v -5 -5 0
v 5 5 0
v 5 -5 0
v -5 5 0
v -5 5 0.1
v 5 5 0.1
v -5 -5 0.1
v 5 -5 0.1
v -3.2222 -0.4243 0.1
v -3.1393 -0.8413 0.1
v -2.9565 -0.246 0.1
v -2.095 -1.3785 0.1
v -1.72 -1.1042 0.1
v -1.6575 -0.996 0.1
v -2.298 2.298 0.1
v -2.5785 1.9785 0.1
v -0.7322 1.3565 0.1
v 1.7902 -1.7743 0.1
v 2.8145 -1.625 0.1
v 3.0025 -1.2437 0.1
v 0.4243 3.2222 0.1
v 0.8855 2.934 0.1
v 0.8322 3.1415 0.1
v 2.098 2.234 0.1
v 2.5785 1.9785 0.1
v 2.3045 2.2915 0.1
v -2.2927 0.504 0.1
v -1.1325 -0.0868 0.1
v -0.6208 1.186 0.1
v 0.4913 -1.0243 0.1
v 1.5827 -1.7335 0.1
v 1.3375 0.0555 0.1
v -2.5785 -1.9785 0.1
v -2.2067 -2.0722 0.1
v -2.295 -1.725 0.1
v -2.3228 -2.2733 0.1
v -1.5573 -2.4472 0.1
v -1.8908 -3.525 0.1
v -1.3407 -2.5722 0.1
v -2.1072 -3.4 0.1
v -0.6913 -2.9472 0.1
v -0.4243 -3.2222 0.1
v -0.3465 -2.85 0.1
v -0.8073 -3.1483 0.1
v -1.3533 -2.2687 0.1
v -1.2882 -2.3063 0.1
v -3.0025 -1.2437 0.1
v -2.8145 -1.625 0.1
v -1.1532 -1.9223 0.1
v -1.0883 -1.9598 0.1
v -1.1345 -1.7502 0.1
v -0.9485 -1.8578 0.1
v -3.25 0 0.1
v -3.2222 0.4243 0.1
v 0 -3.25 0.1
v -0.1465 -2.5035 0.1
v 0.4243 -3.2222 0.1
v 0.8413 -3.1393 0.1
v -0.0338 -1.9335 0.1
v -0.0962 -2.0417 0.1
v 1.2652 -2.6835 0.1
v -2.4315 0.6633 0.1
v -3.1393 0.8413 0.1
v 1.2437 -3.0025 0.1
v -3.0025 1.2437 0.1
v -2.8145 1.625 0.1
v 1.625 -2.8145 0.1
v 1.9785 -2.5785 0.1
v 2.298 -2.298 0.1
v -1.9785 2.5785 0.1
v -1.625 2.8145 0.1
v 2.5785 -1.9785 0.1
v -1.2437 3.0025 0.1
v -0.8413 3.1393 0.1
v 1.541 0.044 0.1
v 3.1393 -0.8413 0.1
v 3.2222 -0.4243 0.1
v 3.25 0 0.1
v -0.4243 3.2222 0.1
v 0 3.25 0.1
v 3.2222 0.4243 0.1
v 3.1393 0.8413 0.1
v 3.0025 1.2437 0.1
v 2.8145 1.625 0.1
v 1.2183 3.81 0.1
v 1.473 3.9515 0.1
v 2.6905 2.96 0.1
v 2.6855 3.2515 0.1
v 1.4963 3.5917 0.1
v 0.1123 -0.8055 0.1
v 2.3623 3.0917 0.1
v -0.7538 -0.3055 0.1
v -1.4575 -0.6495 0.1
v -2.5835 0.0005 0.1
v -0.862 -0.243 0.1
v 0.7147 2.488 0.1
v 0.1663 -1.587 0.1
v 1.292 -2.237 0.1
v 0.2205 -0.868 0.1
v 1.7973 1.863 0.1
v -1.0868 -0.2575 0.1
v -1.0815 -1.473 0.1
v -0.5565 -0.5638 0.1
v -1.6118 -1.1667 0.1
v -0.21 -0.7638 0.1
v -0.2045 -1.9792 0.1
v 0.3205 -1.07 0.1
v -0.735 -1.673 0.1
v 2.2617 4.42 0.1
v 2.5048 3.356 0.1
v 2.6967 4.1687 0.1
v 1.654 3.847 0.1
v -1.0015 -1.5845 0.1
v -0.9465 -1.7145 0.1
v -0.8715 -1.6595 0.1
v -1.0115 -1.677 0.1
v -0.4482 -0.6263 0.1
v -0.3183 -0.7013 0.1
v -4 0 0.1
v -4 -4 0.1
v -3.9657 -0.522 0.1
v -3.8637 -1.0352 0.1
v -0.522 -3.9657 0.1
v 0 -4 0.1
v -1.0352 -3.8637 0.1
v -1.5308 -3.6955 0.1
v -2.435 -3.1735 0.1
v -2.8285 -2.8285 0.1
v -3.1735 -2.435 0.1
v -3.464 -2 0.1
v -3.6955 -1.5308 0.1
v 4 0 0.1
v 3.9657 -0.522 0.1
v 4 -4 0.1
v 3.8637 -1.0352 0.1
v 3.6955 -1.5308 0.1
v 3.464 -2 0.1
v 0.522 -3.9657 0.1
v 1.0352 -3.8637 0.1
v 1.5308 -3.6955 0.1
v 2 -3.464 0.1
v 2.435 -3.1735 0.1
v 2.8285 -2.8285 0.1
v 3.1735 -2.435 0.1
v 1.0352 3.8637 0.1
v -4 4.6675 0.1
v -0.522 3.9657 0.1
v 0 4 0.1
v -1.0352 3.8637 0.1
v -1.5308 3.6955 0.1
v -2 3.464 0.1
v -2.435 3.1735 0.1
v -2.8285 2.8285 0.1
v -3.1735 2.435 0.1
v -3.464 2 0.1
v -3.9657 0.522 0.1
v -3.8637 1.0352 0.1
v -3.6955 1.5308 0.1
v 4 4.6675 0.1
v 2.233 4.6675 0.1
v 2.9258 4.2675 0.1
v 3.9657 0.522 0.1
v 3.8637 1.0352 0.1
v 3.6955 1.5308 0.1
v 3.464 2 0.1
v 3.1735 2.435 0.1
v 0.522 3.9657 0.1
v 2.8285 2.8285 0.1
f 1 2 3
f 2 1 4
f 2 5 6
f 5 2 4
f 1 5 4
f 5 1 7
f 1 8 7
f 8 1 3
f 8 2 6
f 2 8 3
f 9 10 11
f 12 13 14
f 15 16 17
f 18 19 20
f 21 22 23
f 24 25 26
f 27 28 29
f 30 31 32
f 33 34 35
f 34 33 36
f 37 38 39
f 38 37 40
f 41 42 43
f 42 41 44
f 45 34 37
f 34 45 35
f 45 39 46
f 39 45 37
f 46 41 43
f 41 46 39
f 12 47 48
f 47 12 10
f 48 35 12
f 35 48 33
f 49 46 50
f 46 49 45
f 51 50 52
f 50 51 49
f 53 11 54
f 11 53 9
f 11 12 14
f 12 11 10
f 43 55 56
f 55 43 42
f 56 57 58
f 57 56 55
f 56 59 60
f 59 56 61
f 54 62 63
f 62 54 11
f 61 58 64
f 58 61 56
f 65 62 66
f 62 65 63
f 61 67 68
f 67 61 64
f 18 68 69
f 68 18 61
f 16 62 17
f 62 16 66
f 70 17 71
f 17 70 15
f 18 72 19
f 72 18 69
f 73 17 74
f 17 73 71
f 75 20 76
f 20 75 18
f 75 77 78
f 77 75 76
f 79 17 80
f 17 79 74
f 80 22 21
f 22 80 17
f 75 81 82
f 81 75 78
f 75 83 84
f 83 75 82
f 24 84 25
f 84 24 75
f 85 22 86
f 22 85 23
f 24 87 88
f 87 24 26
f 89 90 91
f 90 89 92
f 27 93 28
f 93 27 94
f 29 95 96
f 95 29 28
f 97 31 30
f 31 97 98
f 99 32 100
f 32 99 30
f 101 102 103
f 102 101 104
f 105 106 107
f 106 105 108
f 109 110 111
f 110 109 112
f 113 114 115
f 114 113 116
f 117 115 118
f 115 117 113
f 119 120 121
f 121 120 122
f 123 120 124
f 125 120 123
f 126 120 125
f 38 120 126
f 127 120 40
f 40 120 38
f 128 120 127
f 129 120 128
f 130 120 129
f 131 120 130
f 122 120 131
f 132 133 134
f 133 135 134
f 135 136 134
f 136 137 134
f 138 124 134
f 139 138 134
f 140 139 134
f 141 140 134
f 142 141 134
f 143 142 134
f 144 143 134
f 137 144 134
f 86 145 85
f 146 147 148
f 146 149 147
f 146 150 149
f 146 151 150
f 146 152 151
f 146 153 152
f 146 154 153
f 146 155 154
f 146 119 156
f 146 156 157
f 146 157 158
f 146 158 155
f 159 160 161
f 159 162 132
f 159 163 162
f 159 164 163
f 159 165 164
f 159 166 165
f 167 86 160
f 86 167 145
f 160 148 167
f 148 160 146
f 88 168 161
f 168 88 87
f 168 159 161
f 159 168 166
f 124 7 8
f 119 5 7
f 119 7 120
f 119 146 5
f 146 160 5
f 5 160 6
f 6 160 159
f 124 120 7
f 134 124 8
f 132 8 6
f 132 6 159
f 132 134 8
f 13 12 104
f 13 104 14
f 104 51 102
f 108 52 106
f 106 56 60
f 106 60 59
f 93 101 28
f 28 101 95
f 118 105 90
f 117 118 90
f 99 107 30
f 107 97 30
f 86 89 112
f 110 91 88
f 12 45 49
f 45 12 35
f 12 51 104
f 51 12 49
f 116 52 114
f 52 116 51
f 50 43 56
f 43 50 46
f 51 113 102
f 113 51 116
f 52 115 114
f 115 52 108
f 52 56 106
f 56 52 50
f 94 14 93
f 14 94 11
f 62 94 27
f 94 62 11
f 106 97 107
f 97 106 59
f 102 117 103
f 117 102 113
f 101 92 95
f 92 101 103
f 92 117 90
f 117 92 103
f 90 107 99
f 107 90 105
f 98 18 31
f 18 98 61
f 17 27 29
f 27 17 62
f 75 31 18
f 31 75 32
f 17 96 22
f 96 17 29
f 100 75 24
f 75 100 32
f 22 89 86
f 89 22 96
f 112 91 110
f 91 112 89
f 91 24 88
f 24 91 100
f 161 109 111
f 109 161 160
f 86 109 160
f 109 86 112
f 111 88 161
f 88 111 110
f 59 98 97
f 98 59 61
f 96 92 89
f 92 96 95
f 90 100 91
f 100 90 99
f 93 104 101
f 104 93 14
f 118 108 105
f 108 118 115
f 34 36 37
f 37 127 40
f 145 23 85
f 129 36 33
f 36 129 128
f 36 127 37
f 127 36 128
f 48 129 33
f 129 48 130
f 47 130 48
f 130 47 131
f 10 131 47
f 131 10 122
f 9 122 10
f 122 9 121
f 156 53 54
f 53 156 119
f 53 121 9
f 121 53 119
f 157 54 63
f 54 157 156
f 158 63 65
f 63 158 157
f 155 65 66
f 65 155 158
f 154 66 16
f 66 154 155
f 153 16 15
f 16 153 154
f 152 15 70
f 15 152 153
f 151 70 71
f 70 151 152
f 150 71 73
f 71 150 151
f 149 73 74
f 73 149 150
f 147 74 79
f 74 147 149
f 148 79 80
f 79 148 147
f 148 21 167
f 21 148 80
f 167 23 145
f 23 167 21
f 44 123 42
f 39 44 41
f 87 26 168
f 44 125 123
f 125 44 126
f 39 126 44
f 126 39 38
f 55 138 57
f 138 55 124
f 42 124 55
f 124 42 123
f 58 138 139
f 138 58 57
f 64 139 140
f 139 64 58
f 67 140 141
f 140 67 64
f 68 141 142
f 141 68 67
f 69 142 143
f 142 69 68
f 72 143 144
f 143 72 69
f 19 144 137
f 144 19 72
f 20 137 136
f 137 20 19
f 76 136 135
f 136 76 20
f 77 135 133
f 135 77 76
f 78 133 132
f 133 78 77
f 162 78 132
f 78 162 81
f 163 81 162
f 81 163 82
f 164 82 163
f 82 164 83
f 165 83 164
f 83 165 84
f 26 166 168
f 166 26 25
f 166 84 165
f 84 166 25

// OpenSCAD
// file: s/3068bp11s02.scad
use <../../lib.scad>
function ldraw_lib__s__3068bp11s02() = [
// 0 ~Launch Command Logo Pattern Background
// 0 Name: s\3068bp11s02.dat
// 0 Author: Chris Böhnke [KnightOfTarenta]
// 0 !LDRAW_ORG Subpart UPDATE 2025-03
// 0 !LICENSE Licensed under CC BY 4.0 : see CAreadme.txt
// 
// 0 !HELP Dimensions X = 32; Z = 34.67
// 
// 0 BFC CERTIFY CCW
  [0,"BFC","CERTIFY"],
  [0,"BFC","CCW"],
// 
// 0 !HISTORY 2025-03-30 [OrionP] Official Update 2025-03
// 
// 3 16 -16 0 0 -16 0 -16 -15.863 0 -2.088
  [3,16,-16,0,0,-16,0,-16,-15.863,0,-2.088],
// 3 16 -15.863 0 -2.088 -16 0 -16 -15.455 0 -4.141
  [3,16,-15.863,0,-2.088,-16,0,-16,-15.455,0,-4.141],
// 3 16 -2.088 0 -15.863 -16 0 -16 0 0 -16
  [3,16,-2.088,0,-15.863,-16,0,-16,0,0,-16],
// 3 16 -4.141 0 -15.455 -16 0 -16 -2.088 0 -15.863
  [3,16,-4.141,0,-15.455,-16,0,-16,-2.088,0,-15.863],
// 3 16 -6.123 0 -14.782 -16 0 -16 -4.141 0 -15.455
  [3,16,-6.123,0,-14.782,-16,0,-16,-4.141,0,-15.455],
// 3 16 -7.563 0 -14.1 -16 0 -16 -6.123 0 -14.782
  [3,16,-7.563,0,-14.1,-16,0,-16,-6.123,0,-14.782],
// 3 16 -9.74 0 -12.694 -16 0 -16 -8.429 0 -13.6
  [3,16,-9.74,0,-12.694,-16,0,-16,-8.429,0,-13.6],
// 3 16 -8.429 0 -13.6 -16 0 -16 -7.563 0 -14.1
  [3,16,-8.429,0,-13.6,-16,0,-16,-7.563,0,-14.1],
// 3 16 -11.314 0 -11.314 -16 0 -16 -9.74 0 -12.694
  [3,16,-11.314,0,-11.314,-16,0,-16,-9.74,0,-12.694],
// 3 16 -12.694 0 -9.74 -16 0 -16 -11.314 0 -11.314
  [3,16,-12.694,0,-9.74,-16,0,-16,-11.314,0,-11.314],
// 3 16 -13.856 0 -8 -16 0 -16 -12.694 0 -9.74
  [3,16,-13.856,0,-8,-16,0,-16,-12.694,0,-9.74],
// 3 16 -14.782 0 -6.123 -16 0 -16 -13.856 0 -8
  [3,16,-14.782,0,-6.123,-16,0,-16,-13.856,0,-8],
// 3 16 -15.455 0 -4.141 -16 0 -16 -14.782 0 -6.123
  [3,16,-15.455,0,-4.141,-16,0,-16,-14.782,0,-6.123],
// 3 16 16 0 0 15.863 0 -2.088 16 0 -16
  [3,16,16,0,0,15.863,0,-2.088,16,0,-16],
// 3 16 15.863 0 -2.088 15.455 0 -4.141 16 0 -16
  [3,16,15.863,0,-2.088,15.455,0,-4.141,16,0,-16],
// 3 16 15.455 0 -4.141 14.782 0 -6.123 16 0 -16
  [3,16,15.455,0,-4.141,14.782,0,-6.123,16,0,-16],
// 3 16 14.782 0 -6.123 13.856 0 -8 16 0 -16
  [3,16,14.782,0,-6.123,13.856,0,-8,16,0,-16],
// 3 16 2.088 0 -15.863 0 0 -16 16 0 -16
  [3,16,2.088,0,-15.863,0,0,-16,16,0,-16],
// 3 16 4.141 0 -15.455 2.088 0 -15.863 16 0 -16
  [3,16,4.141,0,-15.455,2.088,0,-15.863,16,0,-16],
// 3 16 6.123 0 -14.782 4.141 0 -15.455 16 0 -16
  [3,16,6.123,0,-14.782,4.141,0,-15.455,16,0,-16],
// 3 16 8 0 -13.856 6.123 0 -14.782 16 0 -16
  [3,16,8,0,-13.856,6.123,0,-14.782,16,0,-16],
// 3 16 9.74 0 -12.694 8 0 -13.856 16 0 -16
  [3,16,9.74,0,-12.694,8,0,-13.856,16,0,-16],
// 3 16 11.314 0 -11.314 9.74 0 -12.694 16 0 -16
  [3,16,11.314,0,-11.314,9.74,0,-12.694,16,0,-16],
// 3 16 12.694 0 -9.74 11.314 0 -11.314 16 0 -16
  [3,16,12.694,0,-9.74,11.314,0,-11.314,16,0,-16],
// 3 16 13.856 0 -8 12.694 0 -9.74 16 0 -16
  [3,16,13.856,0,-8,12.694,0,-9.74,16,0,-16],
// 3 16 5.892 0 15.806 4.141 0 15.455 4.873 0 15.24
  [3,16,5.892,0,15.806,4.141,0,15.455,4.873,0,15.24],
// 3 16 -16 0 18.67 -2.088 0 15.863 0 0 16
  [3,16,-16,0,18.67,-2.088,0,15.863,0,0,16],
// 3 16 -16 0 18.67 -4.141 0 15.455 -2.088 0 15.863
  [3,16,-16,0,18.67,-4.141,0,15.455,-2.088,0,15.863],
// 3 16 -16 0 18.67 -6.123 0 14.782 -4.141 0 15.455
  [3,16,-16,0,18.67,-6.123,0,14.782,-4.141,0,15.455],
// 3 16 -16 0 18.67 -8 0 13.856 -6.123 0 14.782
  [3,16,-16,0,18.67,-8,0,13.856,-6.123,0,14.782],
// 3 16 -16 0 18.67 -9.74 0 12.694 -8 0 13.856
  [3,16,-16,0,18.67,-9.74,0,12.694,-8,0,13.856],
// 3 16 -16 0 18.67 -11.314 0 11.314 -9.74 0 12.694
  [3,16,-16,0,18.67,-11.314,0,11.314,-9.74,0,12.694],
// 3 16 -16 0 18.67 -12.694 0 9.74 -11.314 0 11.314
  [3,16,-16,0,18.67,-12.694,0,9.74,-11.314,0,11.314],
// 3 16 -16 0 18.67 -13.856 0 8 -12.694 0 9.74
  [3,16,-16,0,18.67,-13.856,0,8,-12.694,0,9.74],
// 3 16 -16 0 18.67 -16 0 0 -15.863 0 2.088
  [3,16,-16,0,18.67,-16,0,0,-15.863,0,2.088],
// 3 16 -16 0 18.67 -15.863 0 2.088 -15.455 0 4.141
  [3,16,-16,0,18.67,-15.863,0,2.088,-15.455,0,4.141],
// 3 16 -16 0 18.67 -15.455 0 4.141 -14.782 0 6.123
  [3,16,-16,0,18.67,-15.455,0,4.141,-14.782,0,6.123],
// 3 16 -16 0 18.67 -14.782 0 6.123 -13.856 0 8
  [3,16,-16,0,18.67,-14.782,0,6.123,-13.856,0,8],
// 3 16 16 0 18.67 8.932 0 18.67 11.703 0 17.07
  [3,16,16,0,18.67,8.932,0,18.67,11.703,0,17.07],
// 3 16 16 0 18.67 15.863 0 2.088 16 0 0
  [3,16,16,0,18.67,15.863,0,2.088,16,0,0],
// 3 16 16 0 18.67 15.455 0 4.141 15.863 0 2.088
  [3,16,16,0,18.67,15.455,0,4.141,15.863,0,2.088],
// 3 16 16 0 18.67 14.782 0 6.123 15.455 0 4.141
  [3,16,16,0,18.67,14.782,0,6.123,15.455,0,4.141],
// 3 16 16 0 18.67 13.856 0 8 14.782 0 6.123
  [3,16,16,0,18.67,13.856,0,8,14.782,0,6.123],
// 3 16 16 0 18.67 12.694 0 9.74 13.856 0 8
  [3,16,16,0,18.67,12.694,0,9.74,13.856,0,8],
// 4 16 2.088 0 15.863 4.141 0 15.455 5.892 0 15.806 8.932 0 18.67
  [4,16,2.088,0,15.863,4.141,0,15.455,5.892,0,15.806,8.932,0,18.67],
// 4 16 0 0 16 2.088 0 15.863 8.932 0 18.67 -16 0 18.67
  [4,16,0,0,16,2.088,0,15.863,8.932,0,18.67,-16,0,18.67],
// 4 16 10.742 0 13.006 10.762 0 11.84 11.314 0 11.314 11.703 0 17.07
  [4,16,10.742,0,13.006,10.762,0,11.84,11.314,0,11.314,11.703,0,17.07],
// 4 16 16 0 18.67 11.703 0 17.07 11.314 0 11.314 12.694 0 9.74
  [4,16,16,0,18.67,11.703,0,17.07,11.314,0,11.314,12.694,0,9.74],
];
module ldraw_lib__s__3068bp11s02(step=0, col=false, unit=2/5, alt=false, line=0.2, solid=!$preview)
    makepoly(ldraw_lib__s__3068bp11s02(), step=step, col=col, unit=unit, alt=alt, line=line, solid=solid);
ldraw_lib__s__3068bp11s02(line=0.2);
// file: ../p/logo-launchcommand-bg.scad
use <../lib.scad>
function ldraw_lib__logo_launchcommand_bg() = [
// 0 ~Launch Command Logo Pattern (without Border)
// 0 Name: logo-launchcommand-bg.dat
// 0 Author: Chris Böhnke [KnightOfTarenta]
// 0 !LDRAW_ORG Primitive UPDATE 2025-04
// 0 !LICENSE Licensed under CC BY 4.0 : see CAreadme.txt
// 
// 0 !HELP Dimensions X = 32; Z = 34.67
// 
// 0 BFC CERTIFY CCW
  [0,"BFC","CERTIFY"],
  [0,"BFC","CCW"],
// 
// 0 !HISTORY 2025-04-27 [OrionP] Official Update 2025-04
// 
// 0 // Colour 16 Main Colour
// 3 16 -12.889 0 -1.697 -12.557 0 -3.365 -11.826 0 -.984
  [3,16,-12.889,0,-1.697,-12.557,0,-3.365,-11.826,0,-.984],
// 3 16 -8.38 0 -5.514 -6.88 0 -4.417 -6.63 0 -3.984
  [3,16,-8.38,0,-5.514,-6.88,0,-4.417,-6.63,0,-3.984],
// 3 16 -9.192 0 9.192 -10.314 0 7.914 -2.929 0 5.426
  [3,16,-9.192,0,9.192,-10.314,0,7.914,-2.929,0,5.426],
// 3 16 7.161 0 -7.097 11.258 0 -6.5 12.01 0 -4.975
  [3,16,7.161,0,-7.097,11.258,0,-6.5,12.01,0,-4.975],
// 3 16 1.697 0 12.889 3.542 0 11.736 3.329 0 12.566
  [3,16,1.697,0,12.889,3.542,0,11.736,3.329,0,12.566],
// 3 16 8.392 0 8.936 10.314 0 7.914 9.218 0 9.166
  [3,16,8.392,0,8.936,10.314,0,7.914,9.218,0,9.166],
// 3 16 -9.171 0 2.016 -4.53 0 -.347 -2.483 0 4.744
  [3,16,-9.171,0,2.016,-4.53,0,-.347,-2.483,0,4.744],
// 3 16 1.965 0 -4.097 6.331 0 -6.934 5.35 0 .222
  [3,16,1.965,0,-4.097,6.331,0,-6.934,5.35,0,.222],
// 4 16 -9.18 0 -6.9 -10.314 0 -7.914 -9.291 0 -9.093 -8.827 0 -8.289
  [4,16,-9.18,0,-6.9,-10.314,0,-7.914,-9.291,0,-9.093,-8.827,0,-8.289],
// 4 16 -7.563 0 -14.1 -5.363 0 -10.289 -6.229 0 -9.789 -8.429 0 -13.6
  [4,16,-7.563,0,-14.1,-5.363,0,-10.289,-6.229,0,-9.789,-8.429,0,-13.6],
// 4 16 -1.386 0 -11.4 -2.765 0 -11.789 -3.229 0 -12.593 -1.697 0 -12.889
  [4,16,-1.386,0,-11.4,-2.765,0,-11.789,-3.229,0,-12.593,-1.697,0,-12.889],
// 4 16 -9.18 0 -6.9 -8.827 0 -8.289 -6.229 0 -9.789 -5.413 0 -9.075
  [4,16,-9.18,0,-6.9,-8.827,0,-8.289,-6.229,0,-9.789,-5.413,0,-9.075],
// 4 16 -5.413 0 -9.075 -6.229 0 -9.789 -5.363 0 -10.289 -5.153 0 -9.225
  [4,16,-5.413,0,-9.075,-6.229,0,-9.789,-5.363,0,-10.289,-5.153,0,-9.225],
// 4 16 -1.386 0 -11.4 -5.153 0 -9.225 -5.363 0 -10.289 -2.765 0 -11.789
  [4,16,-1.386,0,-11.4,-5.153,0,-9.225,-5.363,0,-10.289,-2.765,0,-11.789],
// 4 16 -12.557 0 -3.365 -12.01 0 -4.975 -11.258 0 -6.5 -8.38 0 -5.514
  [4,16,-12.557,0,-3.365,-12.01,0,-4.975,-11.258,0,-6.5,-8.38,0,-5.514],
// 4 16 -10.314 0 -7.914 -9.18 0 -6.9 -8.38 0 -5.514 -11.258 0 -6.5
  [4,16,-10.314,0,-7.914,-9.18,0,-6.9,-8.38,0,-5.514,-11.258,0,-6.5],
// 4 16 -4.613 0 -7.689 -5.413 0 -9.075 -5.153 0 -9.225 -4.353 0 -7.839
  [4,16,-4.613,0,-7.689,-5.413,0,-9.075,-5.153,0,-9.225,-4.353,0,-7.839],
// 4 16 -3.794 0 -7.431 -4.538 0 -7.001 -4.613 0 -7.689 -4.353 0 -7.839
  [4,16,-3.794,0,-7.431,-4.538,0,-7.001,-4.613,0,-7.689,-4.353,0,-7.839],
// 4 16 -12.889 0 -1.697 -11.826 0 -.984 -12.889 0 1.697 -13 0 0
  [4,16,-12.889,0,-1.697,-11.826,0,-.984,-12.889,0,1.697,-13,0,0],
// 4 16 -12.557 0 -3.365 -8.38 0 -5.514 -6.63 0 -3.984 -11.826 0 -.984
  [4,16,-12.557,0,-3.365,-8.38,0,-5.514,-6.63,0,-3.984,-11.826,0,-.984],
// 4 16 -1.697 0 -12.889 0 0 -13 -.586 0 -10.014 -1.386 0 -11.4
  [4,16,-1.697,0,-12.889,0,0,-13,-.586,0,-10.014,-1.386,0,-11.4],
// 4 16 0 0 -13 1.697 0 -12.889 3.365 0 -12.557 -.586 0 -10.014
  [4,16,0,0,-13,1.697,0,-12.889,3.365,0,-12.557,-.586,0,-10.014],
// 4 16 5.061 0 -10.734 -.135 0 -7.734 -.385 0 -8.167 -.586 0 -10.014
  [4,16,5.061,0,-10.734,-.135,0,-7.734,-.385,0,-8.167,-.586,0,-10.014],
// 4 16 -11.826 0 -.984 -9.726 0 2.653 -12.557 0 3.365 -12.889 0 1.697
  [4,16,-11.826,0,-.984,-9.726,0,2.653,-12.557,0,3.365,-12.889,0,1.697],
// 4 16 -.586 0 -10.014 3.365 0 -12.557 4.975 0 -12.01 5.061 0 -10.734
  [4,16,-.586,0,-10.014,3.365,0,-12.557,4.975,0,-12.01,5.061,0,-10.734],
// 4 16 -12.557 0 3.365 -9.726 0 2.653 -11.258 0 6.5 -12.01 0 4.975
  [4,16,-12.557,0,3.365,-9.726,0,2.653,-11.258,0,6.5,-12.01,0,4.975],
// 4 16 4.975 0 -12.01 6.5 0 -11.258 7.914 0 -10.314 5.061 0 -10.734
  [4,16,4.975,0,-12.01,6.5,0,-11.258,7.914,0,-10.314,5.061,0,-10.734],
// 4 16 5.061 0 -10.734 7.914 0 -10.314 9.192 0 -9.192 7.161 0 -7.097
  [4,16,5.061,0,-10.734,7.914,0,-10.314,9.192,0,-9.192,7.161,0,-7.097],
// 4 16 -11.258 0 6.5 -9.726 0 2.653 -2.929 0 5.426 -10.314 0 7.914
  [4,16,-11.258,0,6.5,-9.726,0,2.653,-2.929,0,5.426,-10.314,0,7.914],
// 4 16 -6.5 0 11.258 -7.914 0 10.314 -9.192 0 9.192 -2.929 0 5.426
  [4,16,-6.5,0,11.258,-7.914,0,10.314,-9.192,0,9.192,-2.929,0,5.426],
// 4 16 9.192 0 -9.192 10.314 0 -7.914 11.258 0 -6.5 7.161 0 -7.097
  [4,16,9.192,0,-9.192,10.314,0,-7.914,11.258,0,-6.5,7.161,0,-7.097],
// 4 16 -3.365 0 12.557 -4.975 0 12.01 -6.5 0 11.258 -2.929 0 5.426
  [4,16,-3.365,0,12.557,-4.975,0,12.01,-6.5,0,11.258,-2.929,0,5.426],
// 4 16 7.161 0 -7.097 12.01 0 -4.975 12.557 0 -3.365 6.164 0 .176
  [4,16,7.161,0,-7.097,12.01,0,-4.975,12.557,0,-3.365,6.164,0,.176],
// 4 16 12.557 0 -3.365 12.889 0 -1.697 13 0 0 6.164 0 .176
  [4,16,12.557,0,-3.365,12.889,0,-1.697,13,0,0,6.164,0,.176],
// 4 16 -3.365 0 12.557 -2.929 0 5.426 0 0 13 -1.697 0 12.889
  [4,16,-3.365,0,12.557,-2.929,0,5.426,0,0,13,-1.697,0,12.889],
// 4 16 -2.929 0 5.426 3.542 0 11.736 1.697 0 12.889 0 0 13
  [4,16,-2.929,0,5.426,3.542,0,11.736,1.697,0,12.889,0,0,13],
// 4 16 13 0 0 12.889 0 1.697 12.557 0 3.365 6.164 0 .176
  [4,16,13,0,0,12.889,0,1.697,12.557,0,3.365,6.164,0,.176],
// 4 16 11.258 0 6.5 6.164 0 .176 12.557 0 3.365 12.01 0 4.975
  [4,16,11.258,0,6.5,6.164,0,.176,12.557,0,3.365,12.01,0,4.975],
// 4 16 10.314 0 7.914 8.392 0 8.936 6.164 0 .176 11.258 0 6.5
  [4,16,10.314,0,7.914,8.392,0,8.936,6.164,0,.176,11.258,0,6.5],
// 4 16 5.892 0 15.806 4.873 0 15.24 3.329 0 12.566 3.542 0 11.736
  [4,16,5.892,0,15.806,4.873,0,15.24,3.329,0,12.566,3.542,0,11.736],
// 4 16 10.742 0 13.006 8.392 0 8.936 9.218 0 9.166 10.762 0 11.84
  [4,16,10.742,0,13.006,8.392,0,8.936,9.218,0,9.166,10.762,0,11.84],
// 4 16 .449 0 -3.222 9.449 0 12.367 5.985 0 14.367 -3.015 0 -1.222
  [4,16,.449,0,-3.222,9.449,0,12.367,5.985,0,14.367,-3.015,0,-1.222],
// 4 16 -10.334 0 .002 -5.83 0 -2.598 -4.53 0 -.347 -9.171 0 2.016
  [4,16,-10.334,0,.002,-5.83,0,-2.598,-4.53,0,-.347,-9.171,0,2.016],
// 4 16 2.859 0 9.952 -2.483 0 4.744 -4.53 0 -.347 -3.448 0 -.972
  [4,16,2.859,0,9.952,-2.483,0,4.744,-4.53,0,-.347,-3.448,0,-.972],
// 4 16 1.965 0 -4.097 .665 0 -6.348 5.168 0 -8.948 6.331 0 -6.934
  [4,16,1.965,0,-4.097,.665,0,-6.348,5.168,0,-8.948,6.331,0,-6.934],
// 4 16 7.189 0 7.452 .882 0 -3.472 1.965 0 -4.097 5.35 0 .222
  [4,16,7.189,0,7.452,.882,0,-3.472,1.965,0,-4.097,5.35,0,.222],
// 4 16 -6.447 0 -4.667 -4.326 0 -5.892 -2.226 0 -2.255 -4.347 0 -1.03
  [4,16,-6.447,0,-4.667,-4.326,0,-5.892,-2.226,0,-2.255,-4.347,0,-1.03],
// 4 16 -.818 0 -7.917 1.282 0 -4.28 -.84 0 -3.055 -2.94 0 -6.692
  [4,16,-.818,0,-7.917,1.282,0,-4.28,-.84,0,-3.055,-2.94,0,-6.692],
// 4 16 10.019 0 13.424 10.787 0 16.675 9.047 0 17.68 6.616 0 15.388
  [4,16,10.019,0,13.424,10.787,0,16.675,9.047,0,17.68,6.616,0,15.388],
// 4 16 -4.046 0 -6.708 -3.786 0 -6.858 -3.486 0 -6.638 -4.006 0 -6.338
  [4,16,-4.046,0,-6.708,-3.786,0,-6.858,-3.486,0,-6.638,-4.006,0,-6.338],
// 4 16 -3.486 0 -6.638 -1.273 0 -2.805 -1.793 0 -2.505 -4.006 0 -6.338
  [4,16,-3.486,0,-6.638,-1.273,0,-2.805,-1.793,0,-2.505,-4.006,0,-6.338],
];
module ldraw_lib__logo_launchcommand_bg(step=0, col=false, unit=2/5, alt=false, line=0.2, solid=!$preview)
    makepoly(ldraw_lib__logo_launchcommand_bg(), step=step, col=col, unit=unit, alt=alt, line=line, solid=solid);
ldraw_lib__logo_launchcommand_bg(line=0.2);
// file: ../p/box5-12.scad
use <../lib.scad>
function ldraw_lib__box5_12() = [
// 0 Box with 5 Faces without Any Edges
// 0 Name: box5-12.dat
// 0 Author: Chris Dee [cwdee]
// 0 !LDRAW_ORG Primitive UPDATE 2009-02
// 0 !LICENSE Licensed under CC BY 4.0 : see CAreadme.txt
// 
// 0 BFC CERTIFY CCW
  [0,"BFC","CERTIFY"],
  [0,"BFC","CCW"],
// 
// 0 !HISTORY 2009-09-03 [PTadmin] Official Update 2009-02
// 
// 
// 4 16 1 1 1 1 1 -1 -1 1 -1 -1 1 1
  [4,16,1,1,1,1,1,-1,-1,1,-1,-1,1,1],
// 4 16 -1 0 1 1 0 1 1 1 1 -1 1 1
  [4,16,-1,0,1,1,0,1,1,1,1,-1,1,1],
// 4 16 -1 0 -1 -1 0 1 -1 1 1 -1 1 -1
  [4,16,-1,0,-1,-1,0,1,-1,1,1,-1,1,-1],
// 4 16 1 0 -1 -1 0 -1 -1 1 -1 1 1 -1
  [4,16,1,0,-1,-1,0,-1,-1,1,-1,1,1,-1],
// 4 16 1 0 1 1 0 -1 1 1 -1 1 1 1
  [4,16,1,0,1,1,0,-1,1,1,-1,1,1,1],
// 0
];
module ldraw_lib__box5_12(step=0, col=false, unit=2/5, alt=false, line=0.2, solid=!$preview)
    makepoly(ldraw_lib__box5_12(), step=step, col=col, unit=unit, alt=alt, line=line, solid=solid);
ldraw_lib__box5_12(line=0.2);
// main file
use <../lib.scad>
use <../p/box5-12.scad>
use <../p/logo-launchcommand-bg.scad>
use <../p/logo-launchcommand.scad>
use <s/3068bp11s02.scad>
function ldraw_lib__169635c() = [
// 0 Sticker  1.3 x  1.3 with Launch Command Logo Facing Right
// 0 Name: 169635c.dat
// 0 Author: Chris Böhnke [KnightOfTarenta]
// 0 !LDRAW_ORG Part UPDATE 2025-04
// 0 !LICENSE Licensed under CC BY 4.0 : see CAreadme.txt
// 
// 0 BFC CERTIFY CCW
  [0,"BFC","CERTIFY"],
  [0,"BFC","CCW"],
// 
// 0 !KEYWORDS Bricklink 6614stk01, Launch Command, Launch Evac 1
// 0 !KEYWORDS Rebrickable 169635, Set 6614, space port, town
// 
// 0 !HISTORY 2025-04-27 [OrionP] Official Update 2025-04
// 
// 0 // Sticker Base
// 1 16 0 -.25 0 12.5 0 0 0 .25 0 0 0 12.5 box5-12.dat
  [1,16,0,-.25,0,12.5,0,0,0,.25,0,0,0,12.5, ldraw_lib__box5_12()],
// 
// 0 // Pattern
// 1 16 0 -.25 0 .625 0 0 0 1 0 0 0 .625 logo-launchcommand-bg.dat
  [1,16,0,-.25,0,.625,0,0,0,1,0,0,0,.625, ldraw_lib__logo_launchcommand_bg()],
// 1 16 0 -.25 0 .625 0 0 0 1 0 0 0 .625 s\3068bp11s02.dat
  [1,16,0,-.25,0,.625,0,0,0,1,0,0,0,.625, ldraw_lib__s__3068bp11s02()],
// 3 16 0 -.25 -10 -12.5 -.25 -12.5 12.5 -.25 -12.5
  [3,16,0,-.25,-10,-12.5,-.25,-12.5,12.5,-.25,-12.5],
// 3 16 -10 -.25 0 -12.5 -.25 12.5 -12.5 -.25 -12.5
  [3,16,-10,-.25,0,-12.5,-.25,12.5,-12.5,-.25,-12.5],
// 3 16 -10 -.25 0 -12.5 -.25 -12.5 -10 -.25 -10
  [3,16,-10,-.25,0,-12.5,-.25,-12.5,-10,-.25,-10],
// 3 16 -10 -.25 0 -10 -.25 11.66875 -12.5 -.25 12.5
  [3,16,-10,-.25,0,-10,-.25,11.66875,-12.5,-.25,12.5],
// 3 16 -10 -.25 11.66875 5.5825 -.25 11.66875 -12.5 -.25 12.5
  [3,16,-10,-.25,11.66875,5.5825,-.25,11.66875,-12.5,-.25,12.5],
// 3 16 -12.5 -.25 12.5 5.5825 -.25 11.66875 12.5 -.25 12.5
  [3,16,-12.5,-.25,12.5,5.5825,-.25,11.66875,12.5,-.25,12.5],
// 3 16 12.5 -.25 12.5 5.5825 -.25 11.66875 10 -.25 11.66875
  [3,16,12.5,-.25,12.5,5.5825,-.25,11.66875,10,-.25,11.66875],
// 3 16 0 -.25 -10 -10 -.25 -10 -12.5 -.25 -12.5
  [3,16,0,-.25,-10,-10,-.25,-10,-12.5,-.25,-12.5],
// 3 16 10 -.25 -10 0 -.25 -10 12.5 -.25 -12.5
  [3,16,10,-.25,-10,0,-.25,-10,12.5,-.25,-12.5],
// 3 16 10 -.25 0 12.5 -.25 -12.5 12.5 -.25 12.5
  [3,16,10,-.25,0,12.5,-.25,-12.5,12.5,-.25,12.5],
// 3 16 10 -.25 0 12.5 -.25 12.5 10 -.25 11.66875
  [3,16,10,-.25,0,12.5,-.25,12.5,10,-.25,11.66875],
// 3 16 10 -.25 0 10 -.25 -10 12.5 -.25 -12.5
  [3,16,10,-.25,0,10,-.25,-10,12.5,-.25,-12.5],
// 
// 0 BFC NOCLIP
  [0,"BFC","NOCLIP"],
// 1 16 0 -.25 0 .625 0 0 0 1 0 0 0 .625 logo-launchcommand.dat
  [1,16,0,-.25,0,.625,0,0,0,1,0,0,0,.625, ldraw_lib__logo_launchcommand()],
];
module ldraw_lib__169635c(step=0, col=false, unit=2/5, alt=false, line=0.2, solid=!$preview)
    makepoly(ldraw_lib__169635c(), step=step, col=col, unit=unit, alt=alt, line=line, solid=solid);
ldraw_lib__169635c(line=0.2);
